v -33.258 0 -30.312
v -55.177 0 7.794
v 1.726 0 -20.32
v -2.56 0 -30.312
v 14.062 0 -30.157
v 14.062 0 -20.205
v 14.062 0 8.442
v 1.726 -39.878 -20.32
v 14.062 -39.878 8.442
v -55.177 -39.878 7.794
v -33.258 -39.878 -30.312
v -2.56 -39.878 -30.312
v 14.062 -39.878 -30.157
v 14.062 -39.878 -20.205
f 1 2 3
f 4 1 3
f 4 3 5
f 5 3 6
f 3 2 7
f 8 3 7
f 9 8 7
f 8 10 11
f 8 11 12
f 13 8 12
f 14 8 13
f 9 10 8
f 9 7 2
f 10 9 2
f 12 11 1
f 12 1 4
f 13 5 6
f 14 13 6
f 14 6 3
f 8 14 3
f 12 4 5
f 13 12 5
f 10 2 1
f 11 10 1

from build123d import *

# Parameters (mm, degrees)
F1_DEPTH = 39.878


with BuildPart() as f1:
    # F0 (on Front) → F1 (new body)
    with BuildSketch(Plane.XZ):
        Polygon((14.062366, 8.441711), (-55.177242, 7.794467), (-33.257794, -30.311951), (-2.559891, -30.311951), (1.725662, -20.320477), align=None)
        Polygon((1.725662, -20.320477), (-2.559891, -30.311951), (14.062366, -30.156568), (14.062366, -20.205155), align=None)
    extrude(amount=F1_DEPTH)


solid = f1.part
